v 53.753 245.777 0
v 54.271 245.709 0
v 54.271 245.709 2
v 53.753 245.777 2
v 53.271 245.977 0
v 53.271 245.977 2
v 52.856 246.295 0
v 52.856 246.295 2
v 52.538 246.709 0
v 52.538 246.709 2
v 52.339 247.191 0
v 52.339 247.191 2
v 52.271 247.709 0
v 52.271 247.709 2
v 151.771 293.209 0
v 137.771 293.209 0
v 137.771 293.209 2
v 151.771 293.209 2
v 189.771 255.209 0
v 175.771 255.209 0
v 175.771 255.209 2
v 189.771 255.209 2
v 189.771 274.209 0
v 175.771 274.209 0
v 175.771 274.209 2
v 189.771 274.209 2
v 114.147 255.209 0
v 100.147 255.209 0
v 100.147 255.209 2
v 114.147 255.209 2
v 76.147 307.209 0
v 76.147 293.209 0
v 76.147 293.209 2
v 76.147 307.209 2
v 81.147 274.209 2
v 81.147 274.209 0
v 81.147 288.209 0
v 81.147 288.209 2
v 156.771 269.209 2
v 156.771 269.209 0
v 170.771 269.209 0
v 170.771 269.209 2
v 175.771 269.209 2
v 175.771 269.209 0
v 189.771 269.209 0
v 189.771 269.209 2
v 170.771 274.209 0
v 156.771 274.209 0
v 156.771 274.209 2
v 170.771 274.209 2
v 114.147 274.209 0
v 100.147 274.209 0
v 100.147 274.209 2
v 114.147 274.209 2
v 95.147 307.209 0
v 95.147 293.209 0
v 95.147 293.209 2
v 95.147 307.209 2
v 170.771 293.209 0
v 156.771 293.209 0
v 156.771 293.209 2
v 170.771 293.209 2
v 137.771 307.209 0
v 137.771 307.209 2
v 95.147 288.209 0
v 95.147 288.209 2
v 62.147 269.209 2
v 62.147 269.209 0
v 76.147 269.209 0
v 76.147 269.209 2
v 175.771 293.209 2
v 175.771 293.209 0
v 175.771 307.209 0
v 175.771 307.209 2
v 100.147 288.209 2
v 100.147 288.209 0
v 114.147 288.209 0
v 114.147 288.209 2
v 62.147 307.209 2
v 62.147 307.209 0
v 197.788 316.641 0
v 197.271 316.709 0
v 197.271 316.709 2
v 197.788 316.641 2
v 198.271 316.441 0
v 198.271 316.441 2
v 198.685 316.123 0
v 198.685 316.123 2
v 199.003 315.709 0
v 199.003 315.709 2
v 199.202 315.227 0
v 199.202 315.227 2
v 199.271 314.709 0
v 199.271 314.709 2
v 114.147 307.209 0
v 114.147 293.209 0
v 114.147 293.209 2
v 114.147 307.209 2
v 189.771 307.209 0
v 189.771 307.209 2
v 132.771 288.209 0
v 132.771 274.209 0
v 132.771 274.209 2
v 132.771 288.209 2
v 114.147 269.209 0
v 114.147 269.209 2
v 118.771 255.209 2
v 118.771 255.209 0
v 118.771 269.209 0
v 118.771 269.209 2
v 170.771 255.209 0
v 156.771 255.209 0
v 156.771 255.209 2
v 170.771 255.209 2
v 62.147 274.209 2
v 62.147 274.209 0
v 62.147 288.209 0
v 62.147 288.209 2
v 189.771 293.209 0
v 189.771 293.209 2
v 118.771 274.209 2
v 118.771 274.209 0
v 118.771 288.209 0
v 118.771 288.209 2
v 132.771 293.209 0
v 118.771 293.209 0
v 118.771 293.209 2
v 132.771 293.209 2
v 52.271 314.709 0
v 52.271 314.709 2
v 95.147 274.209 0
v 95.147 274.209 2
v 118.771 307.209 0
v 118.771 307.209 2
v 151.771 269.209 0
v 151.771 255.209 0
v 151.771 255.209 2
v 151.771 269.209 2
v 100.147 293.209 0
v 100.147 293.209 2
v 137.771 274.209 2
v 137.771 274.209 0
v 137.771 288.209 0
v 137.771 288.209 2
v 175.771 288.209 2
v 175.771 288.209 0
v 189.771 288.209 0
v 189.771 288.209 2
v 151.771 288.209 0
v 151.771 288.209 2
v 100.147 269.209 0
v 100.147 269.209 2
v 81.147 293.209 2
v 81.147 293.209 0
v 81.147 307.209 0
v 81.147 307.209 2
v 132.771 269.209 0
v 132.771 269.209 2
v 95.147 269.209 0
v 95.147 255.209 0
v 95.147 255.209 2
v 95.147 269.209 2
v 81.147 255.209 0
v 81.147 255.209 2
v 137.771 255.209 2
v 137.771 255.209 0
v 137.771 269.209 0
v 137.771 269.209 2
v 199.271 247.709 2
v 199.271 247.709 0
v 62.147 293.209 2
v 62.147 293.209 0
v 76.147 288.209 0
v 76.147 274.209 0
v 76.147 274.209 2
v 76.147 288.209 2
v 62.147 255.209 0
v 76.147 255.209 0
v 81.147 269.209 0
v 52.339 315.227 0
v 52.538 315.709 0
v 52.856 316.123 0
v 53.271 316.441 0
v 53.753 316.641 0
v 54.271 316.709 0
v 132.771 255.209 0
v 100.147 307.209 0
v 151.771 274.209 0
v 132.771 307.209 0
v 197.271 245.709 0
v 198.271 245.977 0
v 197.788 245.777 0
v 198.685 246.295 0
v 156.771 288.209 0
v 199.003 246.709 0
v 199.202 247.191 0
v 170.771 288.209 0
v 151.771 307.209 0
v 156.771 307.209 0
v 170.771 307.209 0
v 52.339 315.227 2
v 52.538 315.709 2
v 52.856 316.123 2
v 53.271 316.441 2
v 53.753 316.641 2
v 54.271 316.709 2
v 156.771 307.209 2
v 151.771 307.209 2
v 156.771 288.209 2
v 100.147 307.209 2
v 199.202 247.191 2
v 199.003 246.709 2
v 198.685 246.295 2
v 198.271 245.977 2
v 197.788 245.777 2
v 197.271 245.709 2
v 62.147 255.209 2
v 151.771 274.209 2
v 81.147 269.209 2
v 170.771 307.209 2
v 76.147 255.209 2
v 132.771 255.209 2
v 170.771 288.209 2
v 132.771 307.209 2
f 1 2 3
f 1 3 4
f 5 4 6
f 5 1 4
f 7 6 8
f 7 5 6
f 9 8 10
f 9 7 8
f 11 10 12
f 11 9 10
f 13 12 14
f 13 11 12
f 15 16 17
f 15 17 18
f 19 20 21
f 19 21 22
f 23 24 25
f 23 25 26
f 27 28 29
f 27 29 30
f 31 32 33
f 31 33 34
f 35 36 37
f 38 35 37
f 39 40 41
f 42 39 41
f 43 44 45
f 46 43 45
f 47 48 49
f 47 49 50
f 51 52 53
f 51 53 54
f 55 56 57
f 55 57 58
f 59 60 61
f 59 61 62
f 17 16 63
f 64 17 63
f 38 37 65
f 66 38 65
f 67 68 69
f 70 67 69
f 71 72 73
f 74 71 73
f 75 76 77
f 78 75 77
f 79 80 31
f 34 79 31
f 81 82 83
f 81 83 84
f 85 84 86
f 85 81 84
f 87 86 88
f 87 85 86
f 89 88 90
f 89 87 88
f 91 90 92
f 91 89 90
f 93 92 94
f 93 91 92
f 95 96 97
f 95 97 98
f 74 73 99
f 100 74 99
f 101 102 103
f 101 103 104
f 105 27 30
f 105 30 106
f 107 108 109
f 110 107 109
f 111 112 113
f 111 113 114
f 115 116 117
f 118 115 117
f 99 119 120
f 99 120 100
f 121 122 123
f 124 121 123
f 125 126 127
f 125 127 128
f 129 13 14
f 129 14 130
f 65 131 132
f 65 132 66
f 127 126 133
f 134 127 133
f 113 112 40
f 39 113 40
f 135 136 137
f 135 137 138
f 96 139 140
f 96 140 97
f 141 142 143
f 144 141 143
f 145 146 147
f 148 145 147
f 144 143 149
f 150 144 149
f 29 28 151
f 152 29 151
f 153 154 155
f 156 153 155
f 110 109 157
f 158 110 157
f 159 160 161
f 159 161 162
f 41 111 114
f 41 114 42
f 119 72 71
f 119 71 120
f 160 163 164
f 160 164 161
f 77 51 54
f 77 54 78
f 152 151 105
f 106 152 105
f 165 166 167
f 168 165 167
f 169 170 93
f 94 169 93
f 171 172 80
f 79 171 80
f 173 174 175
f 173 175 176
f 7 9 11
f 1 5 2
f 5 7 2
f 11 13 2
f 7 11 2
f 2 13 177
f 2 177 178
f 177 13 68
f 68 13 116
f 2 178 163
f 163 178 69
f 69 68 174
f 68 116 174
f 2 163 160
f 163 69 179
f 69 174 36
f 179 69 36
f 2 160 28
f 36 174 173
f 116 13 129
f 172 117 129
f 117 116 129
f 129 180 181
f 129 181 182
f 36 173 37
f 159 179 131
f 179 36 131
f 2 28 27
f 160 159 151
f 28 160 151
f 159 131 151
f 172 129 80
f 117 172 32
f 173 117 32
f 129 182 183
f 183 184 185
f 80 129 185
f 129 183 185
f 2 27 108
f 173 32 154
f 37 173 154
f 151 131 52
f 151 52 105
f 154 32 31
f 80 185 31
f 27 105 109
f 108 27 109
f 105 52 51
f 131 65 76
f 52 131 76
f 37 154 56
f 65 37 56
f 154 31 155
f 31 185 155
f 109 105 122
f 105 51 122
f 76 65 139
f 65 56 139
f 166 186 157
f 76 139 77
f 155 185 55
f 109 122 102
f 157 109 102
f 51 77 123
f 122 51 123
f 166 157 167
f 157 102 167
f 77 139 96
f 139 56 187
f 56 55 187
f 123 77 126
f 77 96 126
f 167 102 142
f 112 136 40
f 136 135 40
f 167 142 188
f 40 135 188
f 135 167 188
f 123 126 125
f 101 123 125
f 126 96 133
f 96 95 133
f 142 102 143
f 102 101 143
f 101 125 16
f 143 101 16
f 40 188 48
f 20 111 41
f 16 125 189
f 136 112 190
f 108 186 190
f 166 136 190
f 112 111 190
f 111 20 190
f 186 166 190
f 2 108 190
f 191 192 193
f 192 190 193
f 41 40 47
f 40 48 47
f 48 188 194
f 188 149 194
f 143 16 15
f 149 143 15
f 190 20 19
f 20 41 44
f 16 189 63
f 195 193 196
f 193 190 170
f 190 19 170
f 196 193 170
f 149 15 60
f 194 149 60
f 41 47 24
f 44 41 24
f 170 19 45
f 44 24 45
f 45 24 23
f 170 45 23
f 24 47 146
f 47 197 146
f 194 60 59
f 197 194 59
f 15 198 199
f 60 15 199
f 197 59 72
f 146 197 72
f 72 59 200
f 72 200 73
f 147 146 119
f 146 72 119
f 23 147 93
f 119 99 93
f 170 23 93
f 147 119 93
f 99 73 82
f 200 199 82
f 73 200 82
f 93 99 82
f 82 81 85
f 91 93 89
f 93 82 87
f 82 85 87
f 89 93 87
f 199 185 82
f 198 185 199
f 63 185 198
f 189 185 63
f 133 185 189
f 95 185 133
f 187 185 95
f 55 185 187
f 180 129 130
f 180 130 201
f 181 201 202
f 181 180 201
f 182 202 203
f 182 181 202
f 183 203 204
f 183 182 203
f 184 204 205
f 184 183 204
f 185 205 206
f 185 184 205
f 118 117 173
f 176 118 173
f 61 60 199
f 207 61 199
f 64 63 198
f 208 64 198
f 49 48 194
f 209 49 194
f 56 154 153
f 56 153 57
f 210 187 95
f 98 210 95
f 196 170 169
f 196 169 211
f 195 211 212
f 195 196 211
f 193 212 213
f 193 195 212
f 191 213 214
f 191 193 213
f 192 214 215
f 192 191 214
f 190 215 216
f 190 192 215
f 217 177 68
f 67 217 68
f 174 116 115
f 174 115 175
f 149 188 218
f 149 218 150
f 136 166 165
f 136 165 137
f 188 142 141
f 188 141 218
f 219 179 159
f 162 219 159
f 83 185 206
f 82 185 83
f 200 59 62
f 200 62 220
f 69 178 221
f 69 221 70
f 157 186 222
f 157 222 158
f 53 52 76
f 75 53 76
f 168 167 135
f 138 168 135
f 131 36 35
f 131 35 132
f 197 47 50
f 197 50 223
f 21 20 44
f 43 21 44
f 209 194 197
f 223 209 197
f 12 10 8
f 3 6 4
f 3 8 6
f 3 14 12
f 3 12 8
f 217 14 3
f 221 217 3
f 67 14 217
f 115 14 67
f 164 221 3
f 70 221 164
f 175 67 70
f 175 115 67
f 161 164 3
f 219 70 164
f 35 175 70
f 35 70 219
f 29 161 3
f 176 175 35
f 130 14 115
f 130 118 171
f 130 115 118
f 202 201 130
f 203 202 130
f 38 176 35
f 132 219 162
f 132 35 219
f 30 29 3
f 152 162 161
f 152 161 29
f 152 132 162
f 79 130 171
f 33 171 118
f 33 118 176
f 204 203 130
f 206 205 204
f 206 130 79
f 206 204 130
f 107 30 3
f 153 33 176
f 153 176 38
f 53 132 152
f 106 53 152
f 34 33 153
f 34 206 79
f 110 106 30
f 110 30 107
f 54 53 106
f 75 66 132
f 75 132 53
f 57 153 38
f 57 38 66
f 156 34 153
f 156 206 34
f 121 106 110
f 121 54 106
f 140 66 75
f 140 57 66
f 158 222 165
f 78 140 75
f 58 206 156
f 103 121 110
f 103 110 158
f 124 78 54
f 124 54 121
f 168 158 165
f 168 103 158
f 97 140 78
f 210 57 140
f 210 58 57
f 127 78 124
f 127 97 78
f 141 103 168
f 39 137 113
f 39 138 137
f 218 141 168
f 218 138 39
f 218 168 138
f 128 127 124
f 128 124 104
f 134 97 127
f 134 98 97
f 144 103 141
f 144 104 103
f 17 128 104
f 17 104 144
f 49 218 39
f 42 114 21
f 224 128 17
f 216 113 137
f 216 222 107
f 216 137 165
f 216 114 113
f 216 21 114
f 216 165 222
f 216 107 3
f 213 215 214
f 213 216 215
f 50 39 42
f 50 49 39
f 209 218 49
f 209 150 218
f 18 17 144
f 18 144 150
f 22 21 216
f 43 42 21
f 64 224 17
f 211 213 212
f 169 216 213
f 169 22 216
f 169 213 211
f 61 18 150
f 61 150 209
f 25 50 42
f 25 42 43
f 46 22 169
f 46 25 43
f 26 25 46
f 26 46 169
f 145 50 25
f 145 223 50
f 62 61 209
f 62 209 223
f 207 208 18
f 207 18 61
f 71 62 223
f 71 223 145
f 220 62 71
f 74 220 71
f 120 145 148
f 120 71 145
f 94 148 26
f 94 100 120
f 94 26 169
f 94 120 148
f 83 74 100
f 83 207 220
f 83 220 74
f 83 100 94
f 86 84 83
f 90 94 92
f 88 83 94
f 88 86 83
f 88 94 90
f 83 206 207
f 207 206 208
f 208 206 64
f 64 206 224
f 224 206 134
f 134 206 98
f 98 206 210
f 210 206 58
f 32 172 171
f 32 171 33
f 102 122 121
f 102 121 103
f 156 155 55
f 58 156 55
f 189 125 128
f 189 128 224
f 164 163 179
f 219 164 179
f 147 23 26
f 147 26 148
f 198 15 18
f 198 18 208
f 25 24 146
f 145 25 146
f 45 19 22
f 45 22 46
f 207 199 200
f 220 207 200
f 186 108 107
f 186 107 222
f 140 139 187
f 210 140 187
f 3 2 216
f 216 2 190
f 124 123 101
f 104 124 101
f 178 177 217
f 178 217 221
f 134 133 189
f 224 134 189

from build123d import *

# Parameters (mm, degrees)
MODEL_W             = 147
MODEL_H             = 71
MODEL_W_2           = 14
MODEL_H_2           = 14
BOSS_EXTRUDE1_DEPTH = 2
BREAK_CORNER1_DEPTH = 2


# Read off the part's stored shape, not the designer's step: Break-Corner1
with BuildPart() as part:
    # Model → Boss-Extrude1 (new body)
    with BuildSketch(Plane.XY):
        with Locations((125.770541641, 281.208862918)):
            Rectangle(MODEL_W, MODEL_H)
        with Locations((125.770541641, 262.208862918)):
            Rectangle(MODEL_W_2, MODEL_H_2, mode=Mode.SUBTRACT)
        with Locations((125.770541641, 281.208862918)):
            Rectangle(MODEL_W_2, MODEL_H_2, mode=Mode.SUBTRACT)
        with Locations((125.770541641, 300.208862918)):
            Rectangle(MODEL_W_2, MODEL_H_2, mode=Mode.SUBTRACT)
        with Locations((107.146916797, 300.208862918)):
            Rectangle(MODEL_W_2, MODEL_H_2, mode=Mode.SUBTRACT)
        with Locations((88.146916797, 300.208862918)):
            Rectangle(MODEL_W_2, MODEL_H_2, mode=Mode.SUBTRACT)
        with Locations((69.146916797, 300.208862918)):
            Rectangle(MODEL_W_2, MODEL_H_2, mode=Mode.SUBTRACT)
        with Locations((69.146916797, 281.208862918)):
            Rectangle(MODEL_W_2, MODEL_H_2, mode=Mode.SUBTRACT)
        with Locations((69.146916797, 262.208862918)):
            Rectangle(MODEL_W_2, MODEL_H_2, mode=Mode.SUBTRACT)
        with Locations((88.146916797, 281.208862918)):
            Rectangle(MODEL_W_2, MODEL_H_2, mode=Mode.SUBTRACT)
        with Locations((107.146916797, 281.208862918)):
            Rectangle(MODEL_W_2, MODEL_H_2, mode=Mode.SUBTRACT)
        with Locations((88.146916797, 262.208862918)):
            Rectangle(MODEL_W_2, MODEL_H_2, mode=Mode.SUBTRACT)
        with Locations((107.146916797, 262.208862918)):
            Rectangle(MODEL_W_2, MODEL_H_2, mode=Mode.SUBTRACT)
        with Locations((182.770541641, 300.208862918)):
            Rectangle(MODEL_W_2, MODEL_H_2, mode=Mode.SUBTRACT)
        with Locations((163.770541641, 300.208862918)):
            Rectangle(MODEL_W_2, MODEL_H_2, mode=Mode.SUBTRACT)
        with Locations((144.770541641, 300.208862918)):
            Rectangle(MODEL_W_2, MODEL_H_2, mode=Mode.SUBTRACT)
        with Locations((144.770541641, 281.208862918)):
            Rectangle(MODEL_W_2, MODEL_H_2, mode=Mode.SUBTRACT)
        with Locations((144.770541641, 262.208862918)):
            Rectangle(MODEL_W_2, MODEL_H_2, mode=Mode.SUBTRACT)
        with Locations((163.770541641, 281.208862918)):
            Rectangle(MODEL_W_2, MODEL_H_2, mode=Mode.SUBTRACT)
        with Locations((182.770541641, 281.208862918)):
            Rectangle(MODEL_W_2, MODEL_H_2, mode=Mode.SUBTRACT)
        with Locations((163.770541641, 262.208862918)):
            Rectangle(MODEL_W_2, MODEL_H_2, mode=Mode.SUBTRACT)
        with Locations((182.770541641, 262.208862918)):
            Rectangle(MODEL_W_2, MODEL_H_2, mode=Mode.SUBTRACT)
    extrude(amount=BOSS_EXTRUDE1_DEPTH)

    # Break-Corner1 outline → Break-Corner1 (cut)
    with BuildSketch(Plane.XY):
        with BuildLine():
            Line((199.270541641, 245.708862918), (199.270541641, 247.708862918))
            ThreePointArc((199.270541641, 247.708862918), (198.684755203, 246.294649356), (197.270541641, 245.708862918))
            Line((197.270541641, 245.708862918), (199.270541641, 245.708862918))
        make_face()
        with BuildLine():
            ThreePointArc((197.270541641, 316.708862918), (198.684755204, 316.123076481), (199.270541641, 314.708862918))
            Line((199.270541641, 314.708862918), (199.270541641, 316.708862918))
            Line((199.270541641, 316.708862918), (197.270541641, 316.708862918))
        make_face()
        with BuildLine():
            Line((52.270541641, 245.708862918), (54.270541641, 245.708862918))
            ThreePointArc((54.270541641, 245.708862918), (52.856328079, 246.294649356), (52.270541641, 247.708862918))
            Line((52.270541641, 247.708862918), (52.270541641, 245.708862918))
        make_face()
        with BuildLine():
            ThreePointArc((52.270541641, 314.708862918), (52.856328079, 316.123076481), (54.270541641, 316.708862918))
            Line((54.270541641, 316.708862918), (52.270541641, 316.708862918))
            Line((52.270541641, 316.708862918), (52.270541641, 314.708862918))
        make_face()
    extrude(amount=BREAK_CORNER1_DEPTH, mode=Mode.SUBTRACT)


solid = part.part
